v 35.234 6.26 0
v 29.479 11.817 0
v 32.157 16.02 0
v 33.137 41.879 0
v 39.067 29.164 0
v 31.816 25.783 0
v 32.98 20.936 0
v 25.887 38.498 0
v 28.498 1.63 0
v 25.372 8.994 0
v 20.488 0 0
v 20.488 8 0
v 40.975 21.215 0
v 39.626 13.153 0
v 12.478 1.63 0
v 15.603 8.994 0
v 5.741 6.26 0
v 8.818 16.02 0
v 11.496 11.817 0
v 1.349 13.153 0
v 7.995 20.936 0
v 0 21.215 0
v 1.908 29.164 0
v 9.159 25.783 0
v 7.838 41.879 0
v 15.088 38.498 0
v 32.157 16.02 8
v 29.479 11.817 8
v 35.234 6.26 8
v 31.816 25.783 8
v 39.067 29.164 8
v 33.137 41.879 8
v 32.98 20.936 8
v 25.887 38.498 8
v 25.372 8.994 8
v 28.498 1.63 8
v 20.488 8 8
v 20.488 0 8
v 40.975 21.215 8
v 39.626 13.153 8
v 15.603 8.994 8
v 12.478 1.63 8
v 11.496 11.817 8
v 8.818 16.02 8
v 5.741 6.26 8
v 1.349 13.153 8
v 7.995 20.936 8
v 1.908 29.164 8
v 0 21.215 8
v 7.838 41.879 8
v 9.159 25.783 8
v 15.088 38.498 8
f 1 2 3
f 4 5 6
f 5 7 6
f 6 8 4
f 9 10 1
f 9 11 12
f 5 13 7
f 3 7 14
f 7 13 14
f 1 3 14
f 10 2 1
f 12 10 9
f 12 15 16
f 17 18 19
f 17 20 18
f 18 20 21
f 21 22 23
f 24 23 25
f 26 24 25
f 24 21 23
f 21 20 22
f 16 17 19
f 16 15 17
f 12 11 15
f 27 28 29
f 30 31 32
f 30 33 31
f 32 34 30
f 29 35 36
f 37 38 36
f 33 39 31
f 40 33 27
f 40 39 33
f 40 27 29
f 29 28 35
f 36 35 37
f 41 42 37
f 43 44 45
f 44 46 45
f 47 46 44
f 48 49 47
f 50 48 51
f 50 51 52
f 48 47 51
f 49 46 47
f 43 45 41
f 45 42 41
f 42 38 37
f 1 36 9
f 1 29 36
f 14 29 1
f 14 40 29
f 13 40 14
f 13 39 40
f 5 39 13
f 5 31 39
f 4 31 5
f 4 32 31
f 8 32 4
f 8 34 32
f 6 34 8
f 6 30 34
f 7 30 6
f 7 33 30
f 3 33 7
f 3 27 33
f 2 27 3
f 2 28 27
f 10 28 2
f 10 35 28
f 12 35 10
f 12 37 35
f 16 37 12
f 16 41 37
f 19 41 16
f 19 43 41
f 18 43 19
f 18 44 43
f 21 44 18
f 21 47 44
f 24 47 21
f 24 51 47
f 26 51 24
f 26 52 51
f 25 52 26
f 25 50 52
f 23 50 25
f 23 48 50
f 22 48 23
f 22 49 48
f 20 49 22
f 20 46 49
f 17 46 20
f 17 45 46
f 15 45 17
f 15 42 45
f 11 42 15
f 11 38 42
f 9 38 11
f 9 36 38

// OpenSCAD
$fn = 32;

// ----------------------------------------------------------------------
// Clip blank: omega clip, 8 mm thick
// ----------------------------------------------------------------------

// --- parameters (mm) ---
profile_height = 8;       // extrusion height
profile_points = 26;      // points of the closed outline

profile = [[1.908, 29.164], [0, 21.215], [1.349, 13.153], [5.741, 6.26], [12.478, 1.63], [20.488, 0], [28.498, 1.63], [35.234, 6.26], [39.626, 13.153], [40.975, 21.215], [39.067, 29.164], [33.137, 41.879], [25.887, 38.498], [31.816, 25.783], [32.98, 20.936], [32.157, 16.02], [29.479, 11.817], [25.372, 8.994], [20.488, 8], [15.603, 8.994], [11.496, 11.817], [8.818, 16.02], [7.995, 20.936], [9.159, 25.783], [15.088, 38.498], [7.838, 41.879]];  // single closed polygon, 26 points, counter clockwise

// --- the one profile operation ---
linear_extrude(height = profile_height) polygon(points = profile);
